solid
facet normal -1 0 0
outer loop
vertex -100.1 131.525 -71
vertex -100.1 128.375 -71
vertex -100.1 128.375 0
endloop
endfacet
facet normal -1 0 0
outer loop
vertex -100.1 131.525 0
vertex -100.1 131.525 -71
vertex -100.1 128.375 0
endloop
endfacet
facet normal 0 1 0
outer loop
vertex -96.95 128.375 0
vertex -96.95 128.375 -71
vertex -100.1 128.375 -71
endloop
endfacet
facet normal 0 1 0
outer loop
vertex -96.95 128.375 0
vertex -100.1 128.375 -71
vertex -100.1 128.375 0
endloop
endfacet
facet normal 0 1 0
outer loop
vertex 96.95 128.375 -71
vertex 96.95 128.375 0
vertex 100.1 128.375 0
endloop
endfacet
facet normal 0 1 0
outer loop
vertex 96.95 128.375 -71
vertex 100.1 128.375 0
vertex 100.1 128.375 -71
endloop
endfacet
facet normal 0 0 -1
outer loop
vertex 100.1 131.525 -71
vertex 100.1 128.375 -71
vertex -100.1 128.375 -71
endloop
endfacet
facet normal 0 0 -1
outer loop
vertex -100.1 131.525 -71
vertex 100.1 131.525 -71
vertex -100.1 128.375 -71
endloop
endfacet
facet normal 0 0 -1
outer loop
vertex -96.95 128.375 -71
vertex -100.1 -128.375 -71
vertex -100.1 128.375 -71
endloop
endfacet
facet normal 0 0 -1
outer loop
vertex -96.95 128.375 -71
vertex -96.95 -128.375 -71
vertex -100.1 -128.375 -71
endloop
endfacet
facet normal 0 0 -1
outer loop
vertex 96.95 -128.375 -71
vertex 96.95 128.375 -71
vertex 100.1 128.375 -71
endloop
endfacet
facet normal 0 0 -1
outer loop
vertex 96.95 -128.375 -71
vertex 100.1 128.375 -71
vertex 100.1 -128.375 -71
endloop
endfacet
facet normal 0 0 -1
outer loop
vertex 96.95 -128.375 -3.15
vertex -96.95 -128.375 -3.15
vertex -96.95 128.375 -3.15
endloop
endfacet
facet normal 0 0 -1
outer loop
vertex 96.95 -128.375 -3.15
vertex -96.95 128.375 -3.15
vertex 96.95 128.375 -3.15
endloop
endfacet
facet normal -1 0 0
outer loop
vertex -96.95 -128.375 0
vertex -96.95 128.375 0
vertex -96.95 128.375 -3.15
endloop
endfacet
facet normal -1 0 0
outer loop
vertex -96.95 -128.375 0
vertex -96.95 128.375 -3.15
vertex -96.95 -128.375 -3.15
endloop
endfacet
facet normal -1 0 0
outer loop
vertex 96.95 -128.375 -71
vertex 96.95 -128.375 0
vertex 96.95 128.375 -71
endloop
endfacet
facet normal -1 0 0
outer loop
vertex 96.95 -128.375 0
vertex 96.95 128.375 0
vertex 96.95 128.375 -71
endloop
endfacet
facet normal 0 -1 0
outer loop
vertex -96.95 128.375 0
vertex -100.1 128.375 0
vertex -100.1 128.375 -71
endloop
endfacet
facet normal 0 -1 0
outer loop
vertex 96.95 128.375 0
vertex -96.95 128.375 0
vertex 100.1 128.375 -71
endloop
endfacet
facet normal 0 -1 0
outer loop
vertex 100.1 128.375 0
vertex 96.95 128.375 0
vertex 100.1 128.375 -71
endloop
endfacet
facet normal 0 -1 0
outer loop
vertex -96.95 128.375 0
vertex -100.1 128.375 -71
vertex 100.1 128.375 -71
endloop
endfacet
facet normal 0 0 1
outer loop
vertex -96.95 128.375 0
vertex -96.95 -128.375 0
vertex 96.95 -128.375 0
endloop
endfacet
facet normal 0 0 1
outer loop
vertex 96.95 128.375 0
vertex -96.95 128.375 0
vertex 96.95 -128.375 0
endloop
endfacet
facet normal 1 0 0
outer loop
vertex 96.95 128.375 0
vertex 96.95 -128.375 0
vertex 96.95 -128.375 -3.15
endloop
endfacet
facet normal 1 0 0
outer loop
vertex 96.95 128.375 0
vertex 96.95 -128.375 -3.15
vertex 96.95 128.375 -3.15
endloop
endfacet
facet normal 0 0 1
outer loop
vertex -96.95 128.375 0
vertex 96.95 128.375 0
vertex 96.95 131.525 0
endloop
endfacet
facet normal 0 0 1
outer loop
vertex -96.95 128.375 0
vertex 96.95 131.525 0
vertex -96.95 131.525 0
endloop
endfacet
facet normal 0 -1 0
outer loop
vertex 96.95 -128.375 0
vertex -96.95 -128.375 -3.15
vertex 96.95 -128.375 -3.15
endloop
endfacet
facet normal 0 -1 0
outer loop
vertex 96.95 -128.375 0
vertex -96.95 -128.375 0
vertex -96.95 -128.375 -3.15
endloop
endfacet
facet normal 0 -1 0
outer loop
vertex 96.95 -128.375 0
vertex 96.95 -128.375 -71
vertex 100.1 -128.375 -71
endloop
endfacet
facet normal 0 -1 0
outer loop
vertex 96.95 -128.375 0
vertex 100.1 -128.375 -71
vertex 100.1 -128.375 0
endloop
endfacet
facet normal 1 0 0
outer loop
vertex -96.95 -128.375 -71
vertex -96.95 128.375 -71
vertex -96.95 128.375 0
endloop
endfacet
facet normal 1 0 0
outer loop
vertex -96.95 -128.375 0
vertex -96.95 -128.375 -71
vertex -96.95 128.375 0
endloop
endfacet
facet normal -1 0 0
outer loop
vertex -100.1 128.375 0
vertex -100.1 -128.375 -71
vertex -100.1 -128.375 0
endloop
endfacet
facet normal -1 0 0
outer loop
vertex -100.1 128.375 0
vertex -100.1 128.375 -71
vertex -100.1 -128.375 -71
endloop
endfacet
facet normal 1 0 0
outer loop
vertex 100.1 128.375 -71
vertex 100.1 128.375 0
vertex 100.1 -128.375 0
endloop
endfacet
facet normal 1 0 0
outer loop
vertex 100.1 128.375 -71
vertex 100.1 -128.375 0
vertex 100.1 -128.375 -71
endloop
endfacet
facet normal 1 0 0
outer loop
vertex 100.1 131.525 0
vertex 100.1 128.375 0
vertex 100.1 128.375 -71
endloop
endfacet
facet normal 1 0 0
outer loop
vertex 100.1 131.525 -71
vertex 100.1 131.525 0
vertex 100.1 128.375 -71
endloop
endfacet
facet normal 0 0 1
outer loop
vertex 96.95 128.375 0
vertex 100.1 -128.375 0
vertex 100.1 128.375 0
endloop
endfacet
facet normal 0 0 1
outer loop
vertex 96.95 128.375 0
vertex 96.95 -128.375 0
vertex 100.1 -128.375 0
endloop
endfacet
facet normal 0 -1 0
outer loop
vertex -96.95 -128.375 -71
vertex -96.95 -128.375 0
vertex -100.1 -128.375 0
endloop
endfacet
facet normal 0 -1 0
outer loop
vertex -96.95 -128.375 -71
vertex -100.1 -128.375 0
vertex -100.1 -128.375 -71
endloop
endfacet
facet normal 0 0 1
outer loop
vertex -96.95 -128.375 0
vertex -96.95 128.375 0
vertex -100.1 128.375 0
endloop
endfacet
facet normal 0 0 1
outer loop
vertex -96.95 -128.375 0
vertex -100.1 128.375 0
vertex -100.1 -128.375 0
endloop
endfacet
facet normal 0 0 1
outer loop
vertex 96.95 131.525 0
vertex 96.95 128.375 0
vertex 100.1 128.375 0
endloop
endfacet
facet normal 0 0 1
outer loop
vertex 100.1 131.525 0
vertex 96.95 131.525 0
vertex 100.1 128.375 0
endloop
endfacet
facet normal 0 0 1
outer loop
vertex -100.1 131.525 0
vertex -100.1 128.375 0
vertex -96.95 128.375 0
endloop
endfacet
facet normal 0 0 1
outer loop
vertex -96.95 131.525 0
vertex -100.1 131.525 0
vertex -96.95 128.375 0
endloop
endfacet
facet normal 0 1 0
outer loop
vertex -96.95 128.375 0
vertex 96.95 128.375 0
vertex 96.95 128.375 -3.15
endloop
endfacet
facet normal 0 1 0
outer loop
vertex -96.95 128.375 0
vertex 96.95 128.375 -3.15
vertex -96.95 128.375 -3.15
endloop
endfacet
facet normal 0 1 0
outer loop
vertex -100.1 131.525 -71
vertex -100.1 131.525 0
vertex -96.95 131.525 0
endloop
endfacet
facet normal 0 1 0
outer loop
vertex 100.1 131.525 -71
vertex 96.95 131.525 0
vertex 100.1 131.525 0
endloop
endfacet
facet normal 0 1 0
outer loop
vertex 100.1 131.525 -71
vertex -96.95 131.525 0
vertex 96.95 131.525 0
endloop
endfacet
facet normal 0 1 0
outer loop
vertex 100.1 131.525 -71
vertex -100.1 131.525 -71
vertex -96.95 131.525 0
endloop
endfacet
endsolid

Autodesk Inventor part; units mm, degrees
ref_plane "YZ Plane" through (0, 0, 0) normal (1, 0, 0) x (0, 1, 0)
ref_plane "XZ Plane" through (0, 0, 0) normal (0, 1, 0) x (-1, 0, 0)
ref_plane "XY Plane" through (0, 0, 0) normal (0, 0, 1) x (1, 0, 0)
sketch "Sketch1" plane through (0, 0, 0) normal (0, 0, 1) x (1, 0, 0)
  line L0 (-96.95, -128.375) -> (96.95, -128.375)
  line L1 (96.95, -128.375) -> (96.95, 128.375)
  line L2 (96.95, 128.375) -> (-96.95, 128.375)
  line L3 (-96.95, 128.375) -> (-96.95, -128.375)
  line L4 (-96.95, -128.375) -> (96.95, 128.375) construction
  line L5 (96.95, -128.375) -> (-96.95, 128.375) construction
  point P0 (0, 0)
  dimension "d0" = 193.9
  dimension "d1" = 256.75
extrude "Extrusion1" add sketch "Sketch1" against normal blind 3.15
sketch "Sketch2" plane through (96.95, -128.375, 0) normal (1, 0, 0) x (0, 0, -1)
  line L0 (0, 256.75) -> (71, 256.75)
  line L1 (71, 256.75) -> (71, 0)
  line L2 (71, 0) -> (0, 0)
  line L3 (0, 0) -> (0, 256.75)
  point P0 (0, 128.375)
  dimension "d4" = 71
  dimension "d5" = 256.75
extrude "Extrusion2" add sketch "Sketch2" along normal blind 3.15 separate body
mirror "Mirror1" about plane through (0, 0, 0) normal (1, 0, 0) bodies 2
sketch "Sketch3" plane through (-96.95, 128.375, 0) normal (0, 1, 0) x (1, 0, 0)
  line L0 (193.9, 0) -> (0, 0) projected
  line L1 (-3.15, 0) -> (197.05, 0)
  line L2 (197.05, 0) -> (197.05, 71)
  line L3 (197.05, 71) -> (-3.15, 71)
  line L4 (-3.15, 71) -> (-3.15, 0)
  line L5 (-3.15, 71) -> (-3.15, 0) projected
  point P0 (96.95, 0)
  dimension "d8" = 200.2
  dimension "d9" = 71
extrude "Extrusion3" add sketch "Sketch3" along normal blind 3.15 separate body
equation "\"d0\" = shield_x - 2 * shield_t"
equation "\"d1\" = shield_z - shield_t"
equation "\"d2\" = shield_t"
equation "\"d4\" = shield_y"
equation "\"d5\" = shield_z - shield_t"
equation "\"d6\" = shield_t"
equation "\"d8\" = shield_x"
equation "\"d9\" = shield_y"
equation "\"d10\" = shield_t"
equation "\"laserresin\" = 5"
equation "\"st1_thickness\" = 0.91186"
equation "\"st2_thickness\" = 1.5875"
equation "\"al1_thickness\" = 0.79375"
equation "\"al2_thickness\" = 1.5875"
equation "\"bend_factor\" = 2.26205"
equation "\"st1_bend\" = 2.06267"
equation "\"st2_bend\" = 3.591"
equation "\"st3_bend\" = 113.10236"
equation "\"al1_bend\" = 1.7955"
equation "\"al2_bend\" = 3.591"
equation "\"al3_bend\" = 113.10236"
equation "\"acrylic1_thickness\" = 5.88"
equation "\"acrylic2_thickness\" = 3.15"
equation "\"acrylic3_thickness\" = 3.15"
equation "\"corner_small_r\" = 1"
equation "\"corner_big_r\" = 5"
equation "\"linear_bearing_spacing\" = 208"
equation "\"galvo_y_out_offset\" = 27"
equation "\"galvo_y_in_offset\" = 17.5"
equation "\"laser_diameter\" = 13"
equation "\"nema17_x\" = 43"
equation "\"nema17_shaft\" = 24"
equation "\"lmk8uu_x\" = 25"
equation "\"lmk8uu_shaft\" = 15"
equation "\"lmk8uu_z\" = 24"
equation "\"shf8_y\" = 43"
equation "\"acme_nut_d\" = 19.1"
equation "\"acme_nut_upper_d\" = 12.7"
equation "\"handle_spacing\" = 50.8"
equation "\"handle_d\" = 4.7625"
equation "\"handle_hole_d\" = 2.845"
equation "\"handle_projection\" = 20.6375"
equation "\"switch_spacing\" = 19"
equation "\"laser_body_diameter\" = 12"
equation "\"m3_diameter\" = 3"
equation "\"m3_head\" = 6"
equation "\"m4_diameter\" = 4"
equation "\"m5_diameter\" = 5"
equation "\"m5_head\" = 10.3"
equation "\"rivet1_diameter\" = 3.26"
equation "\"rivet2_diameter\" = 3.26"
equation "\"brass_insert_drill\" = 4"
equation "\"m5_brass_insert_drill\" = 6.7"
equation "\"m3_press_nut_drill\" = 4.5"
equation "\"m5_press_nut_drill\" = 6.5"
equation "\"platform_t\" = 1.5875"
equation "\"platform_z\" = 65"
equation "\"platform_fold_x\" = 15"
equation "\"platform_crane_gap\" = 0.1"
equation "\"platform_gap\" = 0.1"
equation "\"platform_upper_y\" = 46.625"
equation "\"crane_t\" = 1.5875"
equation "\"crane_x\" = 233"
equation "\"crane_gap\" = 0.1"
equation "\"tray_t\" = 5.88"
equation "\"tray_to_platform_oversize\" = 0"
equation "\"reservoir_t\" = 0.91186"
equation "\"reservoir_z\" = 35"
equation "\"reservoir_flap_y\" = 20.91186"
equation "\"frame_front_t\" = 0.91186"
equation "\"frame_front_y\" = 56"
equation "\"frame_front_fold\" = 15"
equation "\"frame_gap\" = 0.1"
equation "\"frame_back_t\" = 0.91186"
equation "\"frame_back_x\" = 277.97628"
equation "\"frame_back_y\" = 53.97628"
equation "\"frame_back_z\" = 497.97628"
equation "\"drawer_t\" = 0.91186"
equation "\"drawer_gap\" = 0.1"
equation "\"drawer_reservoir_overlap_x\" = 24.08814"
equation "\"drawer_x\" = 202.02372"
equation "\"drawer_y\" = 73"
equation "\"drawer_seal_y\" = 101"
equation "\"drawer_window_gap\" = 6"
equation "\"foot_t\" = 0.91186"
equation "\"foot_x\" = 198"
equation "\"foot_y\" = 196"
equation "\"laser_holder_t\" = 0.91186"
equation "\"laser_holder_z\" = 75"
equation "\"laser_offset_x\" = 59"
equation "\"laser_offset_y\" = 8.5"
equation "\"subframe_t\" = 0.79375"
equation "\"subframe_x\" = 66"
equation "\"subframe_y\" = 55"
equation "\"shield_x\" = 200.2"
equation "\"shield_y\" = 71"
equation "\"shield_z\" = 259.9"
equation "\"shield_t\" = 3.15"
equation "\"magnet_w\" = 12.8"
equation "\"magnet_t\" = 1.6"
equation "\"sae_4_40_diameter\" = 2.845"
properties part number "shield"
